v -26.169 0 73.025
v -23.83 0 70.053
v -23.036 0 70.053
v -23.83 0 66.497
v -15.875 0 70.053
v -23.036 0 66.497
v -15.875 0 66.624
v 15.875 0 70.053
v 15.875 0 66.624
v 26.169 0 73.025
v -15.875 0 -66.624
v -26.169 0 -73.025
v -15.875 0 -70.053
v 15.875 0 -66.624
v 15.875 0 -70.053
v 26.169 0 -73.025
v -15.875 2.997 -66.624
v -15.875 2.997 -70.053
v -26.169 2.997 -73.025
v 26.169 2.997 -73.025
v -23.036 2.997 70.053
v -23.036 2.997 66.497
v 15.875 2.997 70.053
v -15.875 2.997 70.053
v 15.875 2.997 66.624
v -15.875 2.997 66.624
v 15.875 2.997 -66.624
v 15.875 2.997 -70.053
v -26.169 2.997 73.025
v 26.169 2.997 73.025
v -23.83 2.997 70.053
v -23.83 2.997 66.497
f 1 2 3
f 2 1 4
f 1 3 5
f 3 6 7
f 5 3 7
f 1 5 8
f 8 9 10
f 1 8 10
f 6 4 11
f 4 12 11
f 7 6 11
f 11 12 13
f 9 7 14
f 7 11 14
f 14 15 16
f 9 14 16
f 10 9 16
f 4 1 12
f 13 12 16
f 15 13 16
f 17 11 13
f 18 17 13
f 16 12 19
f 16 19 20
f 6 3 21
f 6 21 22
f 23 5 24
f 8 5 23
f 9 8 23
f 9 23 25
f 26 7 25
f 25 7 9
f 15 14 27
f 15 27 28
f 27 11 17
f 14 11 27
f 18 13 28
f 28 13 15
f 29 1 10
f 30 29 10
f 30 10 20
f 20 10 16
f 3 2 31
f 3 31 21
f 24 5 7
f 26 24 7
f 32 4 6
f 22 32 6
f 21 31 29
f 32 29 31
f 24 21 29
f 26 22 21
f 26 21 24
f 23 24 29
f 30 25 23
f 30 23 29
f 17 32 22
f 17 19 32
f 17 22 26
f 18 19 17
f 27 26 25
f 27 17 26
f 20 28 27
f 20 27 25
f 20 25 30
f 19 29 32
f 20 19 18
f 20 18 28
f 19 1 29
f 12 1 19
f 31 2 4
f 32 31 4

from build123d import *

# Parameters (mm, degrees)
SKETCH1_W           = 52.3380462
SKETCH1_H           = 146.05
SKETCH1_W_2         = 31.75
SKETCH1_H_2         = 3.429
SKETCH1_W_3         = 0.79375
SKETCH1_H_3         = 3.556
BOSS_EXTRUDE1_DEPTH = 2.9972


with BuildPart() as part:
    # Sketch1 → Boss-Extrude1 (new body)
    with BuildSketch(Plane(origin=(0, 0, 0), x_dir=(1, 0, 0), z_dir=(0, 1, 0))):
        Rectangle(SKETCH1_W, SKETCH1_H)
        with Locations((0, 68.3387)):
            Rectangle(SKETCH1_W_2, SKETCH1_H_2, mode=Mode.SUBTRACT)
        with Locations((0, -68.3387)):
            Rectangle(SKETCH1_W_2, SKETCH1_H_2, mode=Mode.SUBTRACT)
        with Locations((-23.432864992, -68.2752)):
            Rectangle(SKETCH1_W_3, SKETCH1_H_3, mode=Mode.SUBTRACT)
    extrude(amount=BOSS_EXTRUDE1_DEPTH)


solid = part.part
